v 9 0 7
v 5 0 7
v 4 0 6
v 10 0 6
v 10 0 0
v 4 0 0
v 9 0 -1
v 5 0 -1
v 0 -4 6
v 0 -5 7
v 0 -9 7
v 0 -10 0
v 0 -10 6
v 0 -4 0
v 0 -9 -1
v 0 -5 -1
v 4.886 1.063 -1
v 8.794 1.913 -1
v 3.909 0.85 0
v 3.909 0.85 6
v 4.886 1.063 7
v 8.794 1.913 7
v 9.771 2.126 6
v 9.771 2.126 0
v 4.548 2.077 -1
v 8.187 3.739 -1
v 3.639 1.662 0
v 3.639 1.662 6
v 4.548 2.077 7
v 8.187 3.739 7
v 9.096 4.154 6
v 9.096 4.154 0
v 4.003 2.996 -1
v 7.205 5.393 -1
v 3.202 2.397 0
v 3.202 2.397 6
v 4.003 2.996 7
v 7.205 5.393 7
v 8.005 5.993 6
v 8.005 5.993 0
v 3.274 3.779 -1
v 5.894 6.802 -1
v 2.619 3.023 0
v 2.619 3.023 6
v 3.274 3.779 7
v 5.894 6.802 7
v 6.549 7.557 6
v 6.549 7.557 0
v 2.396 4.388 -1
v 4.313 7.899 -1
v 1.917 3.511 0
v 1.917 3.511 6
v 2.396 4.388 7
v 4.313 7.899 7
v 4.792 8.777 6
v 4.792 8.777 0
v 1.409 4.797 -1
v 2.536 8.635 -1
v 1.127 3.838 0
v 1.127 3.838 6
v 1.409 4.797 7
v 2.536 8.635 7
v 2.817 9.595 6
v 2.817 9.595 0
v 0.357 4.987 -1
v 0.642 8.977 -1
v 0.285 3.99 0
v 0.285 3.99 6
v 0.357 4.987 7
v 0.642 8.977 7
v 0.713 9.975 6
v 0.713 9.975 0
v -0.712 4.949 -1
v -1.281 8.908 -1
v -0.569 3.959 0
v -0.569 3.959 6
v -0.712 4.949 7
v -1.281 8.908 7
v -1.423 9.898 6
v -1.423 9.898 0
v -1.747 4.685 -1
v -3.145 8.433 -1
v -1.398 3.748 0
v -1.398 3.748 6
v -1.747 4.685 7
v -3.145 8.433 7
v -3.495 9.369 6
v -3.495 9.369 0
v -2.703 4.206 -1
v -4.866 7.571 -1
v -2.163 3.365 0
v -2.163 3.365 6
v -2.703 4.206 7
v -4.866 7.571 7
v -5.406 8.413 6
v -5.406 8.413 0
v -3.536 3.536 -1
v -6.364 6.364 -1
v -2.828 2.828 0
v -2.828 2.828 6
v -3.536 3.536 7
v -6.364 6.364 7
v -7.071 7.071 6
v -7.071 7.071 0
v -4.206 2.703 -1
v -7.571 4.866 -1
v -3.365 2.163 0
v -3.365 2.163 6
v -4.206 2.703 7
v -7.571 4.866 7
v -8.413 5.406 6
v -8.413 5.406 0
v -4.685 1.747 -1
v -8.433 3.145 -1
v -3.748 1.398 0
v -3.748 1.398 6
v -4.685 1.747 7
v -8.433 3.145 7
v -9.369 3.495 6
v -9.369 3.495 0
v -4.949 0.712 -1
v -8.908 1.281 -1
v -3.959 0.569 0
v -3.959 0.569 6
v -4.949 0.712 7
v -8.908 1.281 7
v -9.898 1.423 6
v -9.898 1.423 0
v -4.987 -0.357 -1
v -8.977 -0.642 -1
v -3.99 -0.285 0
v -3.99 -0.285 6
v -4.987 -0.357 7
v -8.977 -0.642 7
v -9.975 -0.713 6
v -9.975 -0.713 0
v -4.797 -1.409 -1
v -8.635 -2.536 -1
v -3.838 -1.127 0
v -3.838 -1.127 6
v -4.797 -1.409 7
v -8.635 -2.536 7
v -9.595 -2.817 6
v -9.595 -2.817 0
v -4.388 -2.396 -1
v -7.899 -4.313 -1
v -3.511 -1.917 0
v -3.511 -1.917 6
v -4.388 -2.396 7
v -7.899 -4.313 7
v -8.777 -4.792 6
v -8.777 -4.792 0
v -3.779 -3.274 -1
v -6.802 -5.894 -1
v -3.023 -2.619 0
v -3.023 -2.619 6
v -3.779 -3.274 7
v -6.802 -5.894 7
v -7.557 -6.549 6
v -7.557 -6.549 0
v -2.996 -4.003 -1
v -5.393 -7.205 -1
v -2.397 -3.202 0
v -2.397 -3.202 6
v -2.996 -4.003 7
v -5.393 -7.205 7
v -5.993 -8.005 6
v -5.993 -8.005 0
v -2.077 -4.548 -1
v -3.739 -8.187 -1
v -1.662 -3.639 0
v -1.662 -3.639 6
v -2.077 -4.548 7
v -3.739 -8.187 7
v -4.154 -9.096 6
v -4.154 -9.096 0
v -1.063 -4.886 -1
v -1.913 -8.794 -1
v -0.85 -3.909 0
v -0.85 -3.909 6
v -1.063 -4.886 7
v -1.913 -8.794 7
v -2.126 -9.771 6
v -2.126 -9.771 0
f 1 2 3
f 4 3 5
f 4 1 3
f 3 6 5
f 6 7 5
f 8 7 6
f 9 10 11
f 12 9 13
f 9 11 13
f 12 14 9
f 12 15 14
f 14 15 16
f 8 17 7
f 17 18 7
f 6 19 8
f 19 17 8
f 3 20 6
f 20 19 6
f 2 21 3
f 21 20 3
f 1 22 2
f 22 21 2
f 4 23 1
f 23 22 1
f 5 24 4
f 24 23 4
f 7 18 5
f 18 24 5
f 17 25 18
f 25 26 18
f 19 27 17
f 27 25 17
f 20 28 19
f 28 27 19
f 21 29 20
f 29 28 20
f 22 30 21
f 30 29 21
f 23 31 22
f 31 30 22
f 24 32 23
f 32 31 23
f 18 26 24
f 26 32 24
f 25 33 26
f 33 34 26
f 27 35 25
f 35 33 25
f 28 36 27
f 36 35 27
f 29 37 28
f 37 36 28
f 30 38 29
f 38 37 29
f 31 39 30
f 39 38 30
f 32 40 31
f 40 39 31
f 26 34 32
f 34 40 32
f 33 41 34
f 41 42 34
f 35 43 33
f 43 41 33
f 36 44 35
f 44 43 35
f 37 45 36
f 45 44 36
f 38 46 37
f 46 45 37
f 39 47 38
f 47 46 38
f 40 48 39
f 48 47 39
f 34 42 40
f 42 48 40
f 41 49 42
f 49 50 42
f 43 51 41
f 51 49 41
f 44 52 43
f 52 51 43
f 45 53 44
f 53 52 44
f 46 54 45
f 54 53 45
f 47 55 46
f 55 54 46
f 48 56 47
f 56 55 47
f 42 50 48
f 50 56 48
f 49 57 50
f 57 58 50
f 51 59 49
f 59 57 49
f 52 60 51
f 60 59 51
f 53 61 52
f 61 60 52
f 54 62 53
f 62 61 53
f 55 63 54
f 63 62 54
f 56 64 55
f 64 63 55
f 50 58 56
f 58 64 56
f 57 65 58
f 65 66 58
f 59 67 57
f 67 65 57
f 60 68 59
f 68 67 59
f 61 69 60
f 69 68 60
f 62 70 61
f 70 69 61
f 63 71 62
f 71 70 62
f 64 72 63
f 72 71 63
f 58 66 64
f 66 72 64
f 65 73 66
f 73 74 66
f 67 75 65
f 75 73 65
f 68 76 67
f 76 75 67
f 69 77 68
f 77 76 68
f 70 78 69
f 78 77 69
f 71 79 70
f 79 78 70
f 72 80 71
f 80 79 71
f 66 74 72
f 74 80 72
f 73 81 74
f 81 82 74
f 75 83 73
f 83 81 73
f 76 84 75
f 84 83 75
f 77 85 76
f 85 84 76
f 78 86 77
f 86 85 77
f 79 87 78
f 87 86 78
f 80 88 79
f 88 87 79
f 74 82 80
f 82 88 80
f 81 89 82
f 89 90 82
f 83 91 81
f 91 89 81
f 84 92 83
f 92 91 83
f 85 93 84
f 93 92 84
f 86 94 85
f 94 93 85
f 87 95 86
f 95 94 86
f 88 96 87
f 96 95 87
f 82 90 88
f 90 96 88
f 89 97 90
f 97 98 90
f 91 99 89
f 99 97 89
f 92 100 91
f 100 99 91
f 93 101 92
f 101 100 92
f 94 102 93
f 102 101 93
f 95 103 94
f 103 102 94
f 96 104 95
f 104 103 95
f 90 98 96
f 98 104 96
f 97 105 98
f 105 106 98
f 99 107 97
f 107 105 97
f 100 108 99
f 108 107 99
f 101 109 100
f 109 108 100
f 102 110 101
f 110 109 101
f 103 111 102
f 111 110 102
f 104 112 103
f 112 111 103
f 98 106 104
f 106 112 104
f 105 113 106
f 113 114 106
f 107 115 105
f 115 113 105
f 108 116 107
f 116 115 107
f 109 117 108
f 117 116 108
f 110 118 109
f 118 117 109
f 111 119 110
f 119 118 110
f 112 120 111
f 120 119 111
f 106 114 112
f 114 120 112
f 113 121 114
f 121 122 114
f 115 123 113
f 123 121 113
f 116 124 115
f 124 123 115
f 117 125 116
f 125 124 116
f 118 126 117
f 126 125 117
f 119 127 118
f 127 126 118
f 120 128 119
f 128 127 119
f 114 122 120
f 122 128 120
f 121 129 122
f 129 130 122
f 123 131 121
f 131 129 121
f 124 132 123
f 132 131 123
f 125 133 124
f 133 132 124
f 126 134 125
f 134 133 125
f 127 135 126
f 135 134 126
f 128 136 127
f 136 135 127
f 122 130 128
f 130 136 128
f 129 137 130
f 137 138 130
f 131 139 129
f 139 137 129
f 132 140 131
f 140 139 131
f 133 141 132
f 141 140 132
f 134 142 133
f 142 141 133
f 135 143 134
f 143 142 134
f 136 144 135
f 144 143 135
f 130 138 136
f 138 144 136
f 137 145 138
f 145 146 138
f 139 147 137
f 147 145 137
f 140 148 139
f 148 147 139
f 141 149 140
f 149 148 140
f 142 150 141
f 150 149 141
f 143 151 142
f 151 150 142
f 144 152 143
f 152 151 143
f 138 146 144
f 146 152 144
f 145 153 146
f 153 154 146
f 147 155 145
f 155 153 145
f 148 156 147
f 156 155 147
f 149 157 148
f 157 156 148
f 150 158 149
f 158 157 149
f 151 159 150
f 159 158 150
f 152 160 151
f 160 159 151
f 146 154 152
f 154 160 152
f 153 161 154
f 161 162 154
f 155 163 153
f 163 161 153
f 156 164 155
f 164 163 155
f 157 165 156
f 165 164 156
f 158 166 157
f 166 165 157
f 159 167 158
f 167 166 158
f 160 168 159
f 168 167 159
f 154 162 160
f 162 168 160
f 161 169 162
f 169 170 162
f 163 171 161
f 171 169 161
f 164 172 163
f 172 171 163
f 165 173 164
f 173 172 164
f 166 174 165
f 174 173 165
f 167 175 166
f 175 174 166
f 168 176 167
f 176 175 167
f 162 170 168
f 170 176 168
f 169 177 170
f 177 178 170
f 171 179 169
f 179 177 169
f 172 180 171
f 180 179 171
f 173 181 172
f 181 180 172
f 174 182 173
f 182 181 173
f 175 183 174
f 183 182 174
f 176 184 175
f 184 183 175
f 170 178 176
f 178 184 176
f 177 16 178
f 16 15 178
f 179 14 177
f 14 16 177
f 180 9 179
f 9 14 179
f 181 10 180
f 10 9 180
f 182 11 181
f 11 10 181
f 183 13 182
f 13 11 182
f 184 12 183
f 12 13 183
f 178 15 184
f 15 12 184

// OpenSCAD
// Stage 2 of docs/audits/exact-geometry-rust.md: extrusions.
// A rounded ring sector: offset(r) of a rectangle revolved by 270 degrees (tori beside cylinders and planes).
// volume: 1555.0466521699227
rotate_extrude(angle=270) translate([5, 0]) offset(r=1) square([4, 6]);
